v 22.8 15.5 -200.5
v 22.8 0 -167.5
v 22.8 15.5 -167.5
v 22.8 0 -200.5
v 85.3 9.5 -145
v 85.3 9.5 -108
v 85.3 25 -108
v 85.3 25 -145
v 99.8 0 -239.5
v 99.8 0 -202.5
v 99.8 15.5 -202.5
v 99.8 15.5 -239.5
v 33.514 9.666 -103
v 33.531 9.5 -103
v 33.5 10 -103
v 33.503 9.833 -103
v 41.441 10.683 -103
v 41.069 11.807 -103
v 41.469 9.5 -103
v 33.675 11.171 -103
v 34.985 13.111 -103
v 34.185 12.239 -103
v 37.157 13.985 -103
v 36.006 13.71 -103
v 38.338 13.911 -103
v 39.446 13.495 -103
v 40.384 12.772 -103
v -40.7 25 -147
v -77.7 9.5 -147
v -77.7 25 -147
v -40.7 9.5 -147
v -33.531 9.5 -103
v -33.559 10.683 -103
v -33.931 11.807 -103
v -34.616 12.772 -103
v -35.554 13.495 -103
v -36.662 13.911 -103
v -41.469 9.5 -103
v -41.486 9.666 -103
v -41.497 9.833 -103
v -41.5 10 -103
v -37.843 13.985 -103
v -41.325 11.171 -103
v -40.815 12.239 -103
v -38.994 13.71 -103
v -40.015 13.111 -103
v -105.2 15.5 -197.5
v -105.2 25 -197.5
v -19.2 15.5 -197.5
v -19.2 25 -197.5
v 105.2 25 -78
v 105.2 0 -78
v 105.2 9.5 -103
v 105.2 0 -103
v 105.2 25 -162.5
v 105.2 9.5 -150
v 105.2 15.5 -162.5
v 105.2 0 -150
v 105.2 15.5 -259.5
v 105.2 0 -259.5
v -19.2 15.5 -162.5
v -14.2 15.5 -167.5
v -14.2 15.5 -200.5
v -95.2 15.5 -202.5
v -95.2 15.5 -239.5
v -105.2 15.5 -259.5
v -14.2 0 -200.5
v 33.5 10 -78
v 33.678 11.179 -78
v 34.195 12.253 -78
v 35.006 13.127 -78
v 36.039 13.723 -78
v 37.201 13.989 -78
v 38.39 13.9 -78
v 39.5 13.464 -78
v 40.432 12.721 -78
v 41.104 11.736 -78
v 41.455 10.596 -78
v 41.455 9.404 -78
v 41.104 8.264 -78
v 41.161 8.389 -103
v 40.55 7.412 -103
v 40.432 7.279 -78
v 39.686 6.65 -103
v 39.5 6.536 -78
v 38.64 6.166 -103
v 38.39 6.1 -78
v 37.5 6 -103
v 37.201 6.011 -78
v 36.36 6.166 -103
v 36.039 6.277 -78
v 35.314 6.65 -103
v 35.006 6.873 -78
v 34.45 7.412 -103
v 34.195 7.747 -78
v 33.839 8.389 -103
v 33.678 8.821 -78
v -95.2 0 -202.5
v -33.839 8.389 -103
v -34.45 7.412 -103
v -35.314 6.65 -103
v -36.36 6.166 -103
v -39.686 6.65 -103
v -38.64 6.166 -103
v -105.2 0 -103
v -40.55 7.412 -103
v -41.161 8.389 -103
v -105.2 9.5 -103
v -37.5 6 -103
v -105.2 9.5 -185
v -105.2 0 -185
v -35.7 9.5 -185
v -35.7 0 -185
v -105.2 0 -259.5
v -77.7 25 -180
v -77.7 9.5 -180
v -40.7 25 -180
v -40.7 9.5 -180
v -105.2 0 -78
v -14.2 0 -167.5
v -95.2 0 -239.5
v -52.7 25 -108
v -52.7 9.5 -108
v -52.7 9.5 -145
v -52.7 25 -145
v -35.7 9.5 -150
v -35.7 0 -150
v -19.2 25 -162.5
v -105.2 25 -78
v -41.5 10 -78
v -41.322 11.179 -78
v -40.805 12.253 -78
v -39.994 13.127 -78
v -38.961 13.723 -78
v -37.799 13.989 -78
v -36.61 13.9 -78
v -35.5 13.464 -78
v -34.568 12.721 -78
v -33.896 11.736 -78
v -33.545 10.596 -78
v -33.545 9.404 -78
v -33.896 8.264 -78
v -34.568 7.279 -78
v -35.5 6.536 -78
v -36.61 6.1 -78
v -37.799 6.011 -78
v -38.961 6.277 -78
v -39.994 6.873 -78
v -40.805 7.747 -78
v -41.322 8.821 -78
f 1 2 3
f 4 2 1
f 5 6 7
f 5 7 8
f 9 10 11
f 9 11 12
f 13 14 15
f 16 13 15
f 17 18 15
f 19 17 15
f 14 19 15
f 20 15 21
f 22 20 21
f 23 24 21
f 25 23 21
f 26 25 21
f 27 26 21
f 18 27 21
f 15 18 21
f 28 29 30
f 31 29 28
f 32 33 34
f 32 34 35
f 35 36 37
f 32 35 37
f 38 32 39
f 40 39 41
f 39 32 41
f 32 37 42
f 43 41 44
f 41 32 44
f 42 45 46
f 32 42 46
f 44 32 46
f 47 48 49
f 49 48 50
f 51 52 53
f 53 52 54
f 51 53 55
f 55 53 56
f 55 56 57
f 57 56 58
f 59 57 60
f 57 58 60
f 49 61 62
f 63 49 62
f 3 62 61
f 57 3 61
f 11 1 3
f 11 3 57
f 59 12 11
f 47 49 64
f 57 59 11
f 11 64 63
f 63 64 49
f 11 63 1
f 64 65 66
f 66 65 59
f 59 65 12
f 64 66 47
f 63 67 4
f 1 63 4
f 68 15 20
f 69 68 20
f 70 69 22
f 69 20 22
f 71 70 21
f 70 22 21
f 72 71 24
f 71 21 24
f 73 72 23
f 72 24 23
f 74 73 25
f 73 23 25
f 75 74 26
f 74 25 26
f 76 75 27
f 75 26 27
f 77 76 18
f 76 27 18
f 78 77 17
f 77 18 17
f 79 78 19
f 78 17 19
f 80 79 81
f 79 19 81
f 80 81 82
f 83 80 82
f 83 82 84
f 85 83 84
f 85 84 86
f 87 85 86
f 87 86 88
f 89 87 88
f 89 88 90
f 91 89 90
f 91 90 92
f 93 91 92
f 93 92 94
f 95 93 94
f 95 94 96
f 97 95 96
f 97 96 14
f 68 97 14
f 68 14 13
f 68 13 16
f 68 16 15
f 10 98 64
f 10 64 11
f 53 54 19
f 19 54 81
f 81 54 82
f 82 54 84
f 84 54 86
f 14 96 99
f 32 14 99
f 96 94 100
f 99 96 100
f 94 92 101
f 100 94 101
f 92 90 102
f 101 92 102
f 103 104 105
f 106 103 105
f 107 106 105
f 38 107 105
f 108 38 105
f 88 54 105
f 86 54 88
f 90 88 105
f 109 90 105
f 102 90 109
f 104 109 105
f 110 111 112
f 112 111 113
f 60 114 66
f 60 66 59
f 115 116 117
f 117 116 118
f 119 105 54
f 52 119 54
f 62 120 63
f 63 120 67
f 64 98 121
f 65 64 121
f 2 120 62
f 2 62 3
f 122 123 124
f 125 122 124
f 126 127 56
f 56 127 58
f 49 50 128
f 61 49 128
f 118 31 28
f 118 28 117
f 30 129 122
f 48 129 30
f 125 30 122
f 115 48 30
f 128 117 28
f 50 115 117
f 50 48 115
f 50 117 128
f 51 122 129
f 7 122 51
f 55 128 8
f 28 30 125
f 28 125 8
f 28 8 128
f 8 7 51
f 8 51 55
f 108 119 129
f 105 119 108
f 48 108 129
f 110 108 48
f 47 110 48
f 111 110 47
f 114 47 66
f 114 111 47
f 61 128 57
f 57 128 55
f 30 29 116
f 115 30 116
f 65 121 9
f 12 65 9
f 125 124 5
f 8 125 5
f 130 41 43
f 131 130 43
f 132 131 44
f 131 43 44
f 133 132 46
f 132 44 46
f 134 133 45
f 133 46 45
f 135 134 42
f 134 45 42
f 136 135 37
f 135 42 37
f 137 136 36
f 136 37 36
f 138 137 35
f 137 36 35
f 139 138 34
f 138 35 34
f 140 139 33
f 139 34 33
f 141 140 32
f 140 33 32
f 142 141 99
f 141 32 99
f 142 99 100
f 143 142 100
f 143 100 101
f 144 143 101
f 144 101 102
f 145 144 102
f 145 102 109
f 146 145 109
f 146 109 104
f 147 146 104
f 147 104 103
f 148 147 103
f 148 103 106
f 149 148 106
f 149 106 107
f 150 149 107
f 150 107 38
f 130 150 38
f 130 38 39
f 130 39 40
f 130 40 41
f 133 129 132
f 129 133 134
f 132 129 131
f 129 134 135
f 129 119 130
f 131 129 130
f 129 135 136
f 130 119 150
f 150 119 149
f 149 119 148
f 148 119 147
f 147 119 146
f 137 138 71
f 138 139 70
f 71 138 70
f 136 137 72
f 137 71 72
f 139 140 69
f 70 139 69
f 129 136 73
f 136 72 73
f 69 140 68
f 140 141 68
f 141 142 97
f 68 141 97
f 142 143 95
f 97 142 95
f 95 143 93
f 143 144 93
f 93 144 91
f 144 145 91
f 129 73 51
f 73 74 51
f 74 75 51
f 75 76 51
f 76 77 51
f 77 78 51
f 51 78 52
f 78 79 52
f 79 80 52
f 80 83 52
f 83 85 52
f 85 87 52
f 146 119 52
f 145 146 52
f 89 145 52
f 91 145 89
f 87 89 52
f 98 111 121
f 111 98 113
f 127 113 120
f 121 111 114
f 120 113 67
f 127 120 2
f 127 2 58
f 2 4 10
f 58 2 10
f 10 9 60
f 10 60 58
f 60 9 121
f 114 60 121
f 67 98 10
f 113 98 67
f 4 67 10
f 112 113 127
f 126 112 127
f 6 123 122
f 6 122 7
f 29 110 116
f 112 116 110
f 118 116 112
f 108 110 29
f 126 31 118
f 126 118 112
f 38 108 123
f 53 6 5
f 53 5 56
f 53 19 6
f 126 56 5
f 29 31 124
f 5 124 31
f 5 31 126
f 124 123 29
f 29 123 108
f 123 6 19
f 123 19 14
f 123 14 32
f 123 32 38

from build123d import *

# Parameters (mm, degrees)
SKETCH1_W                 = 210.4
SKETCH1_H                 = 181.5
SKETCH1_W_2               = 138
SKETCH1_H_2               = 37
SKETCH1_W_3               = 37
SKETCH1_H_3               = 33
SKETCH1_W_4               = 195
BOSS_EXTRUDE1_DEPTH       = 25
SKETCH2_W                 = 37
SKETCH2_H                 = 33
SKETCH2_W_2               = 195
SKETCH2_H_2               = 37
CUT_EXTRUDE1_DEPTH        = 282.126821915
CUT_EXTRUDE1_DEPTH_BACK   = 9.5
SKETCH3_W                 = 37
SKETCH3_H                 = 33
SKETCH3_W_2               = 138
SKETCH3_H_2               = 37
CUT_EXTRUDE2_DEPTH        = 282.126821915
CUT_EXTRUDE2_DEPTH_BACK   = 9.5
F_8_0MM_DOWEL_HOLE1_D     = 8
F_8_0MM_DOWEL_HOLE1_DEPTH = 25


with BuildPart() as part:
    # Sketch1 → Boss-Extrude1 (new body)
    with BuildSketch(Plane(origin=(0, 0, 0), x_dir=(1, 0, 0), z_dir=(0, 1, 0))):
        with Locations((0, 168.75)):
            Rectangle(SKETCH1_W, SKETCH1_H)
        with Locations((16.3, 126.5)):
            Rectangle(SKETCH1_W_2, SKETCH1_H_2, mode=Mode.SUBTRACT)
        with Locations((-59.2, 163.5)):
            Rectangle(SKETCH1_W_3, SKETCH1_H_3, mode=Mode.SUBTRACT)
        with Locations((4.3, 184)):
            Rectangle(SKETCH1_W_3, SKETCH1_H_3, mode=Mode.SUBTRACT)
        with Locations((2.3, 221)):
            Rectangle(SKETCH1_W_4, SKETCH1_H_2, mode=Mode.SUBTRACT)
    extrude(amount=BOSS_EXTRUDE1_DEPTH)

    # Sketch2 → Cut-Extrude1 (cut, two sides)
    with BuildSketch(Plane(origin=(0, 25, 0), x_dir=(1, 0, 0), z_dir=(0, 1, 0))) as cut_extrude1_sk:
        Polygon((-105.2, 259.5), (-105.2, 197.5), (-19.2, 197.5), (-19.2, 162.5), (105.2, 162.5), (105.2, 259.5), align=None)
        with Locations((4.3, 184)):
            Rectangle(SKETCH2_W, SKETCH2_H, mode=Mode.SUBTRACT)
        with Locations((2.3, 221)):
            Rectangle(SKETCH2_W_2, SKETCH2_H_2, mode=Mode.SUBTRACT)
    extrude(amount=CUT_EXTRUDE1_DEPTH, mode=Mode.SUBTRACT)
    extrude(cut_extrude1_sk.sketch, amount=-CUT_EXTRUDE1_DEPTH_BACK, mode=Mode.SUBTRACT)

    # Sketch3 → Cut-Extrude2 (cut, two sides)
    with BuildSketch(Plane.XZ) as cut_extrude2_sk:
        Polygon((-105.2, -103), (-105.2, -185), (-35.7, -185), (-35.7, -150), (105.2, -150), (105.2, -103), align=None)
        with Locations((-59.2, -163.5)):
            Rectangle(SKETCH3_W, SKETCH3_H, mode=Mode.SUBTRACT)
        with Locations((16.3, -126.5)):
            Rectangle(SKETCH3_W_2, SKETCH3_H_2, mode=Mode.SUBTRACT)
    extrude(amount=CUT_EXTRUDE2_DEPTH, mode=Mode.SUBTRACT)
    extrude(cut_extrude2_sk.sketch, amount=-CUT_EXTRUDE2_DEPTH_BACK, mode=Mode.SUBTRACT)

    # Ø8.0mm Dowel Hole1
    with Locations(Plane(origin=(-37.5, 10, -78), x_dir=(1, 0, 0), z_dir=(0, 0, 1))):
        with Locations((0, 0), (75, 0)):
            Hole(F_8_0MM_DOWEL_HOLE1_D / 2, depth=F_8_0MM_DOWEL_HOLE1_DEPTH)


solid = part.part
